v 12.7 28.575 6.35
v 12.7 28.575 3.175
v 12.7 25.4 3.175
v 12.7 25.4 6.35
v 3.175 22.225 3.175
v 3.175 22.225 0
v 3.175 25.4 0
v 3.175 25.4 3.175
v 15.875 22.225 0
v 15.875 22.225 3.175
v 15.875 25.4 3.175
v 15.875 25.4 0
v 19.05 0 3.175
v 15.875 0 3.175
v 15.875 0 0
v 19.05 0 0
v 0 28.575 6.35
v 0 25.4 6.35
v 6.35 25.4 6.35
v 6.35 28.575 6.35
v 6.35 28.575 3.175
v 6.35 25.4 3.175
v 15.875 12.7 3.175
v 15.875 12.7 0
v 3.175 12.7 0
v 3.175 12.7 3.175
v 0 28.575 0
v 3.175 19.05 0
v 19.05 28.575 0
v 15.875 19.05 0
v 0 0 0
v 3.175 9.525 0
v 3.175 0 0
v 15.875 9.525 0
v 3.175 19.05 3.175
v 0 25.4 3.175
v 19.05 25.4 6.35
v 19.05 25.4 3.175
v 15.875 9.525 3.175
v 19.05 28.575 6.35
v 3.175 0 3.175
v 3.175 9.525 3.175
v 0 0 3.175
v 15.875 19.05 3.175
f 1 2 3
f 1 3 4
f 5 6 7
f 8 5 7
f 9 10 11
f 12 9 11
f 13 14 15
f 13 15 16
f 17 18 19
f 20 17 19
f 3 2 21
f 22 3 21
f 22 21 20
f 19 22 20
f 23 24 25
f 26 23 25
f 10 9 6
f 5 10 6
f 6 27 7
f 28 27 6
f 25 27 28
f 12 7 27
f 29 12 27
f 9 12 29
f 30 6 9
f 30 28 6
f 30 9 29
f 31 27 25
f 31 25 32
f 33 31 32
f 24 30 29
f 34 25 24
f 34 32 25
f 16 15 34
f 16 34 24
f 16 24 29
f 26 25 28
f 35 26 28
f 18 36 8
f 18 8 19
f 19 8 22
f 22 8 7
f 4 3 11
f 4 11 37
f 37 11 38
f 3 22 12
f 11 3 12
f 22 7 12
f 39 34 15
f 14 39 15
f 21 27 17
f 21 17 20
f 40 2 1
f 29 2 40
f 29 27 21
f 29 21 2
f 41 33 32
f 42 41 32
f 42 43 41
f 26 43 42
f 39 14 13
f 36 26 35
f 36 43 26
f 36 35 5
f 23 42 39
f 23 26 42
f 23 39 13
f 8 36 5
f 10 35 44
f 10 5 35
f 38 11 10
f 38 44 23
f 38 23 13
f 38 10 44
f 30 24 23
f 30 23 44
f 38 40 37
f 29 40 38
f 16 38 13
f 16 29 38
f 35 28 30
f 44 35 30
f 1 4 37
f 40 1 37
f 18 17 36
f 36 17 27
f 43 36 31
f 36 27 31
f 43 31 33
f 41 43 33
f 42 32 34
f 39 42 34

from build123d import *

# Parameters (mm, degrees)
F0_W     = 3.175
F0_H     = 3.175
F0_H_2   = 6.35
F0_W_2   = 12.7
F1_DEPTH = 3.175
F2_W     = 19.05
F2_H     = 3.175
F3_DEPTH = 6.35
F4_W     = 6.35
F4_H     = 3.175
F5_DEPTH = 25.4


with BuildPart() as f1:
    # F0 (on Top) → F1 (new body)
    with BuildSketch(Plane.XY):
        with Locations((1.5875, 1.5875)):
            Rectangle(F0_W, F0_H)
        with Locations((1.5875, 6.35)):
            Rectangle(F0_W, F0_H_2)
        with Locations((1.5875, 11.1125)):
            Rectangle(F0_W, F0_H)
        with Locations((1.5875, 15.875)):
            Rectangle(F0_W, F0_H_2)
        with Locations((9.525, 11.1125)):
            Rectangle(F0_W_2, F0_H)
        with Locations((1.5875, 20.6375)):
            Rectangle(F0_W, F0_H)
        with Locations((17.4625, 6.35)):
            Rectangle(F0_W, F0_H_2)
        with Locations((17.4625, 11.1125)):
            Rectangle(F0_W, F0_H)
        with Locations((1.5875, 23.8125)):
            Rectangle(F0_W, F0_H)
        with Locations((9.525, 20.6375)):
            Rectangle(F0_W_2, F0_H)
        with Locations((17.4625, 15.875)):
            Rectangle(F0_W, F0_H_2)
        with Locations((17.4625, 1.5875)):
            Rectangle(F0_W, F0_H)
        with Locations((17.4625, 20.6375)):
            Rectangle(F0_W, F0_H)
        with Locations((17.4625, 23.8125)):
            Rectangle(F0_W, F0_H)
    extrude(amount=F1_DEPTH)

    # F2 (on face) → F3 (join)
    with BuildSketch(Plane(origin=(0, 0, 0), x_dir=(1, 0, 0), z_dir=(0, 0, -1))):
        with Locations((9.525, -26.9875)):
            Rectangle(F2_W, F2_H)
    extrude(amount=-F3_DEPTH)

    # F4 (on face) → F5 (cut)
    with BuildSketch(Plane(origin=(0, 28.575, 0), x_dir=(-1, 0, 0), z_dir=(0, 1, 0))):
        with Locations((-9.525, 4.7625)):
            Rectangle(F4_W, F4_H)
    extrude(amount=-F5_DEPTH, mode=Mode.SUBTRACT)


solid = f1.part
